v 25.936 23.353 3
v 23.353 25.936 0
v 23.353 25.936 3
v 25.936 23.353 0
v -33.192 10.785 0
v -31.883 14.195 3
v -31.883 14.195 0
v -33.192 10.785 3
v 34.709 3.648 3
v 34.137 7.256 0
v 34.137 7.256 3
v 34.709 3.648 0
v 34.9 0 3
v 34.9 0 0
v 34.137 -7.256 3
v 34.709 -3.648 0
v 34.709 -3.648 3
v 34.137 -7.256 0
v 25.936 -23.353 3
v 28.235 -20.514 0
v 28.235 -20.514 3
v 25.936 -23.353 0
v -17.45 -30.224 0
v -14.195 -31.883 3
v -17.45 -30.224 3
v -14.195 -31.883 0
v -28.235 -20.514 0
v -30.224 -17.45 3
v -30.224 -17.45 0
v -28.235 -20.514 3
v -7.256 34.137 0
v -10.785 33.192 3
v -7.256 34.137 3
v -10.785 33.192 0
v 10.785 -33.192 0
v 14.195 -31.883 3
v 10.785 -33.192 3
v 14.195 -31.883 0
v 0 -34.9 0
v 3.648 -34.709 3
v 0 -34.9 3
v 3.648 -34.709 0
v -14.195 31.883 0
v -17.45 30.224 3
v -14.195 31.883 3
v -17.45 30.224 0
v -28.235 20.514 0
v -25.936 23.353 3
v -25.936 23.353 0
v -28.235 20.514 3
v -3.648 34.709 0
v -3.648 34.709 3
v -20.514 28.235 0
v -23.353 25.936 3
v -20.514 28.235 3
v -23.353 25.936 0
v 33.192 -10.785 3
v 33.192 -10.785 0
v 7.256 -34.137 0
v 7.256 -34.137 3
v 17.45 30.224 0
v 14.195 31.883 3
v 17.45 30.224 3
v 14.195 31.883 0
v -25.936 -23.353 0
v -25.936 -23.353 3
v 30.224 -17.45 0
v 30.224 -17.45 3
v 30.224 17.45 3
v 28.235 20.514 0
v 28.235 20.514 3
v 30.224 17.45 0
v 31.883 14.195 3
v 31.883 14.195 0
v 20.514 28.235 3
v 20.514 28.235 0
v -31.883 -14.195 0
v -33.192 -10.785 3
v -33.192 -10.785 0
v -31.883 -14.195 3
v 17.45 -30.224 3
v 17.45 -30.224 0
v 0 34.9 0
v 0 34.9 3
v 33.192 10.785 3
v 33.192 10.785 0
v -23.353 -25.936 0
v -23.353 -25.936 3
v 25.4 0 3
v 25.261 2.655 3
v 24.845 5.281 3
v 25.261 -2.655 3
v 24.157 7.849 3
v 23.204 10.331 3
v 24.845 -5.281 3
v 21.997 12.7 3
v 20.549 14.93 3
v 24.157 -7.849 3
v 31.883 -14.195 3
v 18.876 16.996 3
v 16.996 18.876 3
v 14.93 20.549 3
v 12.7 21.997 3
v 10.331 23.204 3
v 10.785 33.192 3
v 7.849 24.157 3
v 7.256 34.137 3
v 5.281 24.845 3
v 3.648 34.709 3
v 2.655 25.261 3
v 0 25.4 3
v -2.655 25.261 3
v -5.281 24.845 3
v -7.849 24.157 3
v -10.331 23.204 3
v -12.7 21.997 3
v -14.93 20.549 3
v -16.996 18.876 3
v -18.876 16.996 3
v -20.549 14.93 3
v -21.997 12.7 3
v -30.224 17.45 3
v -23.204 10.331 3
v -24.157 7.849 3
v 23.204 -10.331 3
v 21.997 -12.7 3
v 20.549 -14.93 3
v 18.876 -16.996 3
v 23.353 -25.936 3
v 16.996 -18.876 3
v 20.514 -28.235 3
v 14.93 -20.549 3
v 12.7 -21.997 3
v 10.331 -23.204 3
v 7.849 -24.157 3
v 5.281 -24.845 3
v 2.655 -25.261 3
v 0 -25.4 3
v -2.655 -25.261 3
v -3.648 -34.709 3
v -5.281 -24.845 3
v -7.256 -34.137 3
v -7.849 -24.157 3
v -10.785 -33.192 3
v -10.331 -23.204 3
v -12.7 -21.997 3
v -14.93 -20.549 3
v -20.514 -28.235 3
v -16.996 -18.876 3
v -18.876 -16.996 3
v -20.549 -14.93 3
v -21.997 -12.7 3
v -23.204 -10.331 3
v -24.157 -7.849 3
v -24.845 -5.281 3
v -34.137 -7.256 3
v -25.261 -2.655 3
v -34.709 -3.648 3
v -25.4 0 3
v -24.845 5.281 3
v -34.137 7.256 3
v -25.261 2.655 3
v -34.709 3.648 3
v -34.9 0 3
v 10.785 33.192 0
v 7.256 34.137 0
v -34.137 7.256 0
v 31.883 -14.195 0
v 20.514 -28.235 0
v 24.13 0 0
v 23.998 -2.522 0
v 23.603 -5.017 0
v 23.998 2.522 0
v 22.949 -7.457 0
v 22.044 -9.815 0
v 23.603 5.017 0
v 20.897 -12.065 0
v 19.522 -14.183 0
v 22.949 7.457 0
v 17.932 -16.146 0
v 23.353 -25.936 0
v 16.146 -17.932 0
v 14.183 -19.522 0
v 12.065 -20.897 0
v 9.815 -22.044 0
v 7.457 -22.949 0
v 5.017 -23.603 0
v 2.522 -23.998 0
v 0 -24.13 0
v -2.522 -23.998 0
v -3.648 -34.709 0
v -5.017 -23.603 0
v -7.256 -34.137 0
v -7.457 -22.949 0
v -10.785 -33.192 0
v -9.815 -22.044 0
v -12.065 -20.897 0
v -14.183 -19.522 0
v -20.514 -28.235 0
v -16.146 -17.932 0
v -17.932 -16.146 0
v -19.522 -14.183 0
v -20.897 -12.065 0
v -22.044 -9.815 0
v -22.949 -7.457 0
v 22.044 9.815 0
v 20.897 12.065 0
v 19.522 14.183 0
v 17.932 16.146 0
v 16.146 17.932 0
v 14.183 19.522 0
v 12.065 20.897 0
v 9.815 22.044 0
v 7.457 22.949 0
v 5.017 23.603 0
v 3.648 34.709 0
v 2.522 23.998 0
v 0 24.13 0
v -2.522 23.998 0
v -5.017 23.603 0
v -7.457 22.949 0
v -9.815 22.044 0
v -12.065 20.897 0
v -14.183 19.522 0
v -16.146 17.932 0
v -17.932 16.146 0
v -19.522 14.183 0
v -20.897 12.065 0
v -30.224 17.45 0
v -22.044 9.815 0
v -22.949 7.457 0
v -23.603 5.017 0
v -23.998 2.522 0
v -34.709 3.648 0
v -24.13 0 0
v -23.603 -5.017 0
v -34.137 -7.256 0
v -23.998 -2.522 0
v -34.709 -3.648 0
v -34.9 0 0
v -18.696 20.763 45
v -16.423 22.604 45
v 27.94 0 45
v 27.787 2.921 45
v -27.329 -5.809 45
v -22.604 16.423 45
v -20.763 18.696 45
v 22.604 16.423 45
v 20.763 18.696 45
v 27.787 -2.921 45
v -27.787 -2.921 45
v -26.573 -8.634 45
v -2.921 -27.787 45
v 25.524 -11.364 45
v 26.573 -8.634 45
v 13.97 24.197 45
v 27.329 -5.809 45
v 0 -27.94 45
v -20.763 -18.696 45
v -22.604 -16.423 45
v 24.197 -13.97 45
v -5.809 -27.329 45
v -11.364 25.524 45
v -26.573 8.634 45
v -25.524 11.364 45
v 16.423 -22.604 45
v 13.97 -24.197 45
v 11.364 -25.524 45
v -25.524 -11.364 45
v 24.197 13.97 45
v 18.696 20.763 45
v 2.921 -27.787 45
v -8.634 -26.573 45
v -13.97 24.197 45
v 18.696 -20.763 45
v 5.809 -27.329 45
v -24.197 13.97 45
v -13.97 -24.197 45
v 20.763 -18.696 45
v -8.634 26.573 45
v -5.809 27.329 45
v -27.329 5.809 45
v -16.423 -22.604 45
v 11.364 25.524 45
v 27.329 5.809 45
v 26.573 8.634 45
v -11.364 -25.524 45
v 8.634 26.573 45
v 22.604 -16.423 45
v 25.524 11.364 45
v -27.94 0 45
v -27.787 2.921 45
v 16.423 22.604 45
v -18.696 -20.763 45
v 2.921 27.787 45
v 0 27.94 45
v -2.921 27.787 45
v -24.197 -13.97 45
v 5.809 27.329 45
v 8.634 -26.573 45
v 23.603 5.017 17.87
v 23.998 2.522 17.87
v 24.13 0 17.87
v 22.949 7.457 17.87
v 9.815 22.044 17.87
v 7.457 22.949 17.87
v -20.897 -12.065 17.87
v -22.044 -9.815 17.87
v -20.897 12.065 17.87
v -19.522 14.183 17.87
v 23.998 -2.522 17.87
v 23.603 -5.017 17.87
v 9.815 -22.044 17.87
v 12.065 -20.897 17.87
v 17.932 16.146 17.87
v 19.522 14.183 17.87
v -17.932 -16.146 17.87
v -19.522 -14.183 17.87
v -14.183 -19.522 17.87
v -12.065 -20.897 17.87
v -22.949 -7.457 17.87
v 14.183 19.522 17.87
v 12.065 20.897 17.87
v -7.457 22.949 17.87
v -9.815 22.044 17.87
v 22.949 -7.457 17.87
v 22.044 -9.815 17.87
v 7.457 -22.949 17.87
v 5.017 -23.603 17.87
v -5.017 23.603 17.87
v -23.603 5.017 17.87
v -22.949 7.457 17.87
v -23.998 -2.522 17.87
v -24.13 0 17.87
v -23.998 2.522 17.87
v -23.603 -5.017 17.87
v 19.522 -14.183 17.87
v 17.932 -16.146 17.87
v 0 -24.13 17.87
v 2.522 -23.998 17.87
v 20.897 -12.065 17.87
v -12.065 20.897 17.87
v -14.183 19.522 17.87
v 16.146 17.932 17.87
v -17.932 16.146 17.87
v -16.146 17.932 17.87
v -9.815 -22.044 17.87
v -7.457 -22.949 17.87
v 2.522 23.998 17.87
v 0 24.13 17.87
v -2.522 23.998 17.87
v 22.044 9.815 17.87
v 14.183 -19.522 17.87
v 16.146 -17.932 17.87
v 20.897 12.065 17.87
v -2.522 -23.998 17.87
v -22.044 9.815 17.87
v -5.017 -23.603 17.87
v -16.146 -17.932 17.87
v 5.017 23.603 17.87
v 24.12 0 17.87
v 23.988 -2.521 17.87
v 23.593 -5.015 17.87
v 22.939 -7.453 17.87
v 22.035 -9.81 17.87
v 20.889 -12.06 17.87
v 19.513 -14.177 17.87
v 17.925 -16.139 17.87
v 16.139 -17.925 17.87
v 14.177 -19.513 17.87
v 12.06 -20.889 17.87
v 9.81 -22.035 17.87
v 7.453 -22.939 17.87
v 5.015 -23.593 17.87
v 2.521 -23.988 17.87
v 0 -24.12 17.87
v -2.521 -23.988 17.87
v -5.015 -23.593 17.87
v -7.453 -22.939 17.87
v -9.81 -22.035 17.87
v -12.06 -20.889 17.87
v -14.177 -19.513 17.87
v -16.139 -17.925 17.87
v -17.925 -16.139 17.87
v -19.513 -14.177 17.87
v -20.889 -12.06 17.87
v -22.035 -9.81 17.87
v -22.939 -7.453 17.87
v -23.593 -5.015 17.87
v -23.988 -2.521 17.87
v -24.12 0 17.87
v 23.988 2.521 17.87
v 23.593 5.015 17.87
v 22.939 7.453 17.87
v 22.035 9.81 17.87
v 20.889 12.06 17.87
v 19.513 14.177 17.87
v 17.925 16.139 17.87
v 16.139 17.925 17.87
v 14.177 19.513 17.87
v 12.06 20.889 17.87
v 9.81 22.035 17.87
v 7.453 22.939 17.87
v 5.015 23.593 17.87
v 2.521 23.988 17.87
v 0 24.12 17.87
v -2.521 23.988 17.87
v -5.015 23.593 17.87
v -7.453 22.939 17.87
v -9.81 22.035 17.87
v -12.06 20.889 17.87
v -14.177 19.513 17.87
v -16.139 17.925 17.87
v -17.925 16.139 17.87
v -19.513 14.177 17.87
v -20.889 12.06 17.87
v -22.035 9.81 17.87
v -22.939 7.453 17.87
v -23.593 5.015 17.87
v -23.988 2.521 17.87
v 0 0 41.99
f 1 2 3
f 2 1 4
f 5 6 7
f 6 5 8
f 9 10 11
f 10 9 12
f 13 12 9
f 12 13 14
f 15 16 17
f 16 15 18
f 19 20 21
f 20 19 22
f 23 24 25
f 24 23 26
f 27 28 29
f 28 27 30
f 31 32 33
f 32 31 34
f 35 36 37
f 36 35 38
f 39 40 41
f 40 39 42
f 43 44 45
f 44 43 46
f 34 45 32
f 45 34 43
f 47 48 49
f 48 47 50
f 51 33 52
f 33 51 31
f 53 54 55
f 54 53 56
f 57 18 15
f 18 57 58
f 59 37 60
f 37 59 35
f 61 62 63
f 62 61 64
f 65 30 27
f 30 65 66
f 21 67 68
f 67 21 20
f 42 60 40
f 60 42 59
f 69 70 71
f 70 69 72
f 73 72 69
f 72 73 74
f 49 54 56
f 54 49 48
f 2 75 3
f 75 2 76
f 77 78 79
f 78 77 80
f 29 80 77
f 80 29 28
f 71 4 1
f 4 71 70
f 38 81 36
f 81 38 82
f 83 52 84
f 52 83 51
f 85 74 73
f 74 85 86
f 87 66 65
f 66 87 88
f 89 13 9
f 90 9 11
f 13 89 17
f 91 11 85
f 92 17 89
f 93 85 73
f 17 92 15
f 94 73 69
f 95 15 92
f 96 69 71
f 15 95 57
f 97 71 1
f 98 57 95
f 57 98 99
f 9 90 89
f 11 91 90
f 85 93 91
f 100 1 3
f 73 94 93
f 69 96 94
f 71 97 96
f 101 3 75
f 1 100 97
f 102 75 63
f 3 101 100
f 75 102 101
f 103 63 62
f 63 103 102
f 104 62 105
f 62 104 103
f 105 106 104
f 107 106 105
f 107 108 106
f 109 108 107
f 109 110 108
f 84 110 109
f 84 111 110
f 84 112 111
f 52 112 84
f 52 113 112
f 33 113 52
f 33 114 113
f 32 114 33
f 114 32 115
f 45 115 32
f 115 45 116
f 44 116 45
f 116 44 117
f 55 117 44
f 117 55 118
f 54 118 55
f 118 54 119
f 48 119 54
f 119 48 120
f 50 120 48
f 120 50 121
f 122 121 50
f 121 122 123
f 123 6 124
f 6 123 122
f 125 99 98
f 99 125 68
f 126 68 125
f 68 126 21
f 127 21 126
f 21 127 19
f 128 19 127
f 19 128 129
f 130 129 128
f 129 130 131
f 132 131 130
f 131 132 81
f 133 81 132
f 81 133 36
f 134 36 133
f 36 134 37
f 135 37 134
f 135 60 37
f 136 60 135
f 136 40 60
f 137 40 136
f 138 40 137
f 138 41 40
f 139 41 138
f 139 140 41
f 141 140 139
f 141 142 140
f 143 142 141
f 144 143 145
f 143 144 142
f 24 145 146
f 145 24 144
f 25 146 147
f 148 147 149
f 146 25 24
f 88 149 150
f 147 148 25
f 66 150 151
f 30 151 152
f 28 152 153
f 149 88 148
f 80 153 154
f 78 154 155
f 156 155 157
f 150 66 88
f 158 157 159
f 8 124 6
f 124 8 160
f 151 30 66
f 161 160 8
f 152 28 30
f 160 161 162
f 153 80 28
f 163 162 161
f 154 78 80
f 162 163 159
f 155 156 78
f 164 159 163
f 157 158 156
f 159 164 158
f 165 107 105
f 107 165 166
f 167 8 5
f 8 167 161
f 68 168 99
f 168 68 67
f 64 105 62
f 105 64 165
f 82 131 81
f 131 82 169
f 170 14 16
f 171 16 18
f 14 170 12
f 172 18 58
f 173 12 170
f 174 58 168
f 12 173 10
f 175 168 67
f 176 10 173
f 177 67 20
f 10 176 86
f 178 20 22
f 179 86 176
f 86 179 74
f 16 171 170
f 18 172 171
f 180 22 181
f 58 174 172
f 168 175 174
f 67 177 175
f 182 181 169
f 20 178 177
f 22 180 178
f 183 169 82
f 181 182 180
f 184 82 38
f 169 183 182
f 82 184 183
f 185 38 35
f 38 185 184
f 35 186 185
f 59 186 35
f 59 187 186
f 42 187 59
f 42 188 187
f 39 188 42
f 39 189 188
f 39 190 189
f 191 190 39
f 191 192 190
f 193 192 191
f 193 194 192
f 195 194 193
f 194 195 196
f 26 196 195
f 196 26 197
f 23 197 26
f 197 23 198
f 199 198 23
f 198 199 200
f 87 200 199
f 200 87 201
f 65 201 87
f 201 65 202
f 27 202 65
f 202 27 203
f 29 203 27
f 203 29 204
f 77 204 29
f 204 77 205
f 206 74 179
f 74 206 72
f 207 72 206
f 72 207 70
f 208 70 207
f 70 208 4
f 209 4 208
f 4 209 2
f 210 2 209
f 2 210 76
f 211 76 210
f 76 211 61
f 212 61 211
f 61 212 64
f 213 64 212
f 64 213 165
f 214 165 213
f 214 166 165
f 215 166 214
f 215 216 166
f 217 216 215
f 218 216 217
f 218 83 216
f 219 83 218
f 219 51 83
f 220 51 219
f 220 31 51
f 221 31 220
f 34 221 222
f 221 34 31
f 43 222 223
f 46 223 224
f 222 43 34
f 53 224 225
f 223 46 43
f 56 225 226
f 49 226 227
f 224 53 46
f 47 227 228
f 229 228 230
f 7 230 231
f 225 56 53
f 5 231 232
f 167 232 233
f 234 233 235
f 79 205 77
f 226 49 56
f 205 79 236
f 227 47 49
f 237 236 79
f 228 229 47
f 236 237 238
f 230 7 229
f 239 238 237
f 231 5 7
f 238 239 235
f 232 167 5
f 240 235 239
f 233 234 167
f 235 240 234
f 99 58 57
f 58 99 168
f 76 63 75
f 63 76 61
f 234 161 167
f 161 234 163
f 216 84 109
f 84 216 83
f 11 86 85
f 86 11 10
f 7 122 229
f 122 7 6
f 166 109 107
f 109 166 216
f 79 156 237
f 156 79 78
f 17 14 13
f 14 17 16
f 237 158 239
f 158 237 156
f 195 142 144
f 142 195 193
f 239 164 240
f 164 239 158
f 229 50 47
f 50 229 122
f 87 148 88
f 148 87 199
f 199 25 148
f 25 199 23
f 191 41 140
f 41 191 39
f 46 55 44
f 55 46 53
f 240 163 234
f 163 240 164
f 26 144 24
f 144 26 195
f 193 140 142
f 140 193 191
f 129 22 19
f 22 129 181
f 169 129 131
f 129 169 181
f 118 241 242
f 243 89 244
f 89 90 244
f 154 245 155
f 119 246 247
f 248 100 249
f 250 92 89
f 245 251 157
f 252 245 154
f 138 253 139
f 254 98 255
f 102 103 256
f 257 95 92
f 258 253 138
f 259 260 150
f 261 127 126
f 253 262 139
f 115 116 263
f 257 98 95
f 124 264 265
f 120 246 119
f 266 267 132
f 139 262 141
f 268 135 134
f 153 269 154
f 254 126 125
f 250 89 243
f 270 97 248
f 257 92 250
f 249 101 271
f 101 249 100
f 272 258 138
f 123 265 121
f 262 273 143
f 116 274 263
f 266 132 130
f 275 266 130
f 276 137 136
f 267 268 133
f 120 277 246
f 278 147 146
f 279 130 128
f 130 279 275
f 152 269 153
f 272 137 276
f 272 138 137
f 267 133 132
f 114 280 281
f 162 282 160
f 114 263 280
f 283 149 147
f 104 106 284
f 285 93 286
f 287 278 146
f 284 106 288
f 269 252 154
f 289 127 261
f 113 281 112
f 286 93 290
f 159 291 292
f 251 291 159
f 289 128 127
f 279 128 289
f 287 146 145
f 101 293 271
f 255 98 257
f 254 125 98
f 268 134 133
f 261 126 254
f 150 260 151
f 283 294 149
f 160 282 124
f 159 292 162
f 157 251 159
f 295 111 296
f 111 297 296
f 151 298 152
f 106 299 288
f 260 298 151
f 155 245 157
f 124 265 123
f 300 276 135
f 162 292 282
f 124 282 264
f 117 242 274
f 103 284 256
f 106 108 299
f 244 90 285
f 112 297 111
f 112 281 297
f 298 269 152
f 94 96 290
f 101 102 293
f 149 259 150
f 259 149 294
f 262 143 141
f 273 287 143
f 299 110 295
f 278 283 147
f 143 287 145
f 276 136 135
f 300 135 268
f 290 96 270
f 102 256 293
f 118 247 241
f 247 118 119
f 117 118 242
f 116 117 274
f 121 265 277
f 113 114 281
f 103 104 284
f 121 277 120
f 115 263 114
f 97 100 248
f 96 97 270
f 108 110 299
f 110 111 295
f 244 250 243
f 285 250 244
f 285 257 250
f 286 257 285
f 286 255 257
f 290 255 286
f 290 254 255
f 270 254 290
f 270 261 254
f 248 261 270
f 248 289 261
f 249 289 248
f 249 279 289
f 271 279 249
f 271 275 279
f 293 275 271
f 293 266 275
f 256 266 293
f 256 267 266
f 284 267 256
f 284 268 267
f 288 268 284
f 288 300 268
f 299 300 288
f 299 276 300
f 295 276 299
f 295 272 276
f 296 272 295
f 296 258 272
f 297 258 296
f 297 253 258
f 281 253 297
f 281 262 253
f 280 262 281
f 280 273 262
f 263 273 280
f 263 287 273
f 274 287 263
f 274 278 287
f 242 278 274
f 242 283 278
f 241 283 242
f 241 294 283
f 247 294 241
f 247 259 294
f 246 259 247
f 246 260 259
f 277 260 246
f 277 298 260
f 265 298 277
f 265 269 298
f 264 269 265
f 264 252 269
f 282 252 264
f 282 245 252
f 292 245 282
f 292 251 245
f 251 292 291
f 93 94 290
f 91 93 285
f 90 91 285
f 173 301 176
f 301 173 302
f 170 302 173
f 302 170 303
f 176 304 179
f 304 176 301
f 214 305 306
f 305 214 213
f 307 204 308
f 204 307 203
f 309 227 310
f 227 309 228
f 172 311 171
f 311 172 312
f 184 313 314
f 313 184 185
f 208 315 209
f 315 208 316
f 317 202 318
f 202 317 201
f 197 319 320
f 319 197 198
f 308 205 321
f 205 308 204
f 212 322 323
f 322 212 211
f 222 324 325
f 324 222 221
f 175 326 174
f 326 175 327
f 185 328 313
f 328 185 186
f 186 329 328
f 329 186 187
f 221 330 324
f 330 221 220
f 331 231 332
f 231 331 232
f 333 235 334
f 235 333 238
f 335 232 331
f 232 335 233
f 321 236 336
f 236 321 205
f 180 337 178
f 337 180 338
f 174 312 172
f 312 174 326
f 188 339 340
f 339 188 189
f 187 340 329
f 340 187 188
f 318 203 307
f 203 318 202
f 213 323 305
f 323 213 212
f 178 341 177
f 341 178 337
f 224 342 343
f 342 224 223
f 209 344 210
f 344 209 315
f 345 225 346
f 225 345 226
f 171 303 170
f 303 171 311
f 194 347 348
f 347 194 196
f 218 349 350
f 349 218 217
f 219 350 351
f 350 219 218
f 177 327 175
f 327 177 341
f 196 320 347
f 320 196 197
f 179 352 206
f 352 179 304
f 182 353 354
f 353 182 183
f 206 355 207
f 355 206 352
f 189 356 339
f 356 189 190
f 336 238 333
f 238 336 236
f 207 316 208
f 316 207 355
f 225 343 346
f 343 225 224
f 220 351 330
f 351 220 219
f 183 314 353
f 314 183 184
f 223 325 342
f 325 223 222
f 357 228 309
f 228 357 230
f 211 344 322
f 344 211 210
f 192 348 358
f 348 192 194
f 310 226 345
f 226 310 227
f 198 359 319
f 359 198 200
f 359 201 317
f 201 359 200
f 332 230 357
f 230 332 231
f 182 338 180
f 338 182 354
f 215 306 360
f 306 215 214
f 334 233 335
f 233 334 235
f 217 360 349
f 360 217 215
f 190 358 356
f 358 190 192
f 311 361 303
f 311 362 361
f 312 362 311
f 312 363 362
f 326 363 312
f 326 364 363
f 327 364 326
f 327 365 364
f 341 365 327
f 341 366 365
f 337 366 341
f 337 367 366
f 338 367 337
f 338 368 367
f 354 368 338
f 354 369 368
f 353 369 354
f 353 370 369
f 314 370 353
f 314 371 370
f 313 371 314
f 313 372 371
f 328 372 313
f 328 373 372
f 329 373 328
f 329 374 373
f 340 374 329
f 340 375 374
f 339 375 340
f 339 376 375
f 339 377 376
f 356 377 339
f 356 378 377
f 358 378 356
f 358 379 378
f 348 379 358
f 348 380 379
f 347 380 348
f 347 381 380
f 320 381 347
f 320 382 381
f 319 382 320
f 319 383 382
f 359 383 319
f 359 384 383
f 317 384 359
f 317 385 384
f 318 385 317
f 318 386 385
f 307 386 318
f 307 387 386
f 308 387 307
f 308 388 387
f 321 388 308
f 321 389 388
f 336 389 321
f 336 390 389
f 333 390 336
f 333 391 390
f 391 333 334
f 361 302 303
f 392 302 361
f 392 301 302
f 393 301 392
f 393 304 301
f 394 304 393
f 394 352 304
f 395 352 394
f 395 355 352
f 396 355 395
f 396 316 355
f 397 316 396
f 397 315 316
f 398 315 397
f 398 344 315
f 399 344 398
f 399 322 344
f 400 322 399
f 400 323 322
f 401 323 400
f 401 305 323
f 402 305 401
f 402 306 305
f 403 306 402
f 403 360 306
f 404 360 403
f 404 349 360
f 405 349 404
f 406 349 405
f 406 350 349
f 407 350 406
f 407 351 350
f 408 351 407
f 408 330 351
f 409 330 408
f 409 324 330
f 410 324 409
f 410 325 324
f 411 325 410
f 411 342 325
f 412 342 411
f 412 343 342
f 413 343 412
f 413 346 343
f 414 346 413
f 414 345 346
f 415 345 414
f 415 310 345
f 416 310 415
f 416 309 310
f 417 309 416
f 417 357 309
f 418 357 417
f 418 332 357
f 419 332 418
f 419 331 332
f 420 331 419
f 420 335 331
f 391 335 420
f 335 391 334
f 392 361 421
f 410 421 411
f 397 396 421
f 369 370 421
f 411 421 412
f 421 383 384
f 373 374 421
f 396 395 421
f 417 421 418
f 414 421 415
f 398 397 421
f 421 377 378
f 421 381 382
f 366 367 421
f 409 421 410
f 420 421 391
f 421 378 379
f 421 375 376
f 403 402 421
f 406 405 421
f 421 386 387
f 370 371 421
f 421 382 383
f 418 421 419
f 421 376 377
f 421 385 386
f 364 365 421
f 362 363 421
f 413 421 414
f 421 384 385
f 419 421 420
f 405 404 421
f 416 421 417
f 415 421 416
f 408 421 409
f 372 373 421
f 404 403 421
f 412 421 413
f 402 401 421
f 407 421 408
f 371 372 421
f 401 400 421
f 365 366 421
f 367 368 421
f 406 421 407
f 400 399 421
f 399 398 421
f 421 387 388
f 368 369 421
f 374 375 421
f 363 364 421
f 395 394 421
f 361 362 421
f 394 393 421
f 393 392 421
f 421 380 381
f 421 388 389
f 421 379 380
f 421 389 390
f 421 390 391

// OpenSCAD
// Number of segments per circle (higher values = smoother circles, but larger files)
segments_per_circle = 60; // [12:180]

$fn = segments_per_circle;

// The outer radius of the bottom of the body of the hat (in millimeters)
hat_outer_rad_bottom = 25.4;  // [1:150]
// The rate of taper from the bottom of the hat to the top
hat_taper = 1.1; // [1.0, 1.1, 1.2, 1.3, 1.4, 1.5, 1.6, 1.7, 1.8, 1.9, 2.0]

hat_outer_rad_top = hat_outer_rad_bottom * hat_taper;
hat_inner_rad = hat_outer_rad_bottom * 0.95;

// Height of the hat (in millimeters)
total_hat_hgt = 45; // [1:150]

// Thickness of the brim (in millimeters)
hat_brim_hgt = 3; // [1:150]

hat_hgt = total_hat_hgt - hat_brim_hgt;

// Width of the brim (in millimeters)
hat_brim_width = 9.5; // [0:150]

hat_brim_rad = hat_outer_rad_bottom + hat_brim_width;

difference() {
	union() { // the outside of the hat
		cylinder(h = hat_brim_hgt, r = hat_brim_rad, center = false);
		translate([0, 0, hat_brim_hgt]) cylinder(h = hat_hgt, r1 = hat_outer_rad_bottom, r2 = hat_outer_rad_top, center = false);
	}
	union() { // hollow out the inside
		cylinder(h = hat_hgt - hat_inner_rad, r = hat_inner_rad, center = false);
		translate([0, 0, hat_hgt - hat_inner_rad - 0.01]) cylinder(h = hat_inner_rad, r1 = hat_inner_rad, r2 = 0, center = false);
	}
}
